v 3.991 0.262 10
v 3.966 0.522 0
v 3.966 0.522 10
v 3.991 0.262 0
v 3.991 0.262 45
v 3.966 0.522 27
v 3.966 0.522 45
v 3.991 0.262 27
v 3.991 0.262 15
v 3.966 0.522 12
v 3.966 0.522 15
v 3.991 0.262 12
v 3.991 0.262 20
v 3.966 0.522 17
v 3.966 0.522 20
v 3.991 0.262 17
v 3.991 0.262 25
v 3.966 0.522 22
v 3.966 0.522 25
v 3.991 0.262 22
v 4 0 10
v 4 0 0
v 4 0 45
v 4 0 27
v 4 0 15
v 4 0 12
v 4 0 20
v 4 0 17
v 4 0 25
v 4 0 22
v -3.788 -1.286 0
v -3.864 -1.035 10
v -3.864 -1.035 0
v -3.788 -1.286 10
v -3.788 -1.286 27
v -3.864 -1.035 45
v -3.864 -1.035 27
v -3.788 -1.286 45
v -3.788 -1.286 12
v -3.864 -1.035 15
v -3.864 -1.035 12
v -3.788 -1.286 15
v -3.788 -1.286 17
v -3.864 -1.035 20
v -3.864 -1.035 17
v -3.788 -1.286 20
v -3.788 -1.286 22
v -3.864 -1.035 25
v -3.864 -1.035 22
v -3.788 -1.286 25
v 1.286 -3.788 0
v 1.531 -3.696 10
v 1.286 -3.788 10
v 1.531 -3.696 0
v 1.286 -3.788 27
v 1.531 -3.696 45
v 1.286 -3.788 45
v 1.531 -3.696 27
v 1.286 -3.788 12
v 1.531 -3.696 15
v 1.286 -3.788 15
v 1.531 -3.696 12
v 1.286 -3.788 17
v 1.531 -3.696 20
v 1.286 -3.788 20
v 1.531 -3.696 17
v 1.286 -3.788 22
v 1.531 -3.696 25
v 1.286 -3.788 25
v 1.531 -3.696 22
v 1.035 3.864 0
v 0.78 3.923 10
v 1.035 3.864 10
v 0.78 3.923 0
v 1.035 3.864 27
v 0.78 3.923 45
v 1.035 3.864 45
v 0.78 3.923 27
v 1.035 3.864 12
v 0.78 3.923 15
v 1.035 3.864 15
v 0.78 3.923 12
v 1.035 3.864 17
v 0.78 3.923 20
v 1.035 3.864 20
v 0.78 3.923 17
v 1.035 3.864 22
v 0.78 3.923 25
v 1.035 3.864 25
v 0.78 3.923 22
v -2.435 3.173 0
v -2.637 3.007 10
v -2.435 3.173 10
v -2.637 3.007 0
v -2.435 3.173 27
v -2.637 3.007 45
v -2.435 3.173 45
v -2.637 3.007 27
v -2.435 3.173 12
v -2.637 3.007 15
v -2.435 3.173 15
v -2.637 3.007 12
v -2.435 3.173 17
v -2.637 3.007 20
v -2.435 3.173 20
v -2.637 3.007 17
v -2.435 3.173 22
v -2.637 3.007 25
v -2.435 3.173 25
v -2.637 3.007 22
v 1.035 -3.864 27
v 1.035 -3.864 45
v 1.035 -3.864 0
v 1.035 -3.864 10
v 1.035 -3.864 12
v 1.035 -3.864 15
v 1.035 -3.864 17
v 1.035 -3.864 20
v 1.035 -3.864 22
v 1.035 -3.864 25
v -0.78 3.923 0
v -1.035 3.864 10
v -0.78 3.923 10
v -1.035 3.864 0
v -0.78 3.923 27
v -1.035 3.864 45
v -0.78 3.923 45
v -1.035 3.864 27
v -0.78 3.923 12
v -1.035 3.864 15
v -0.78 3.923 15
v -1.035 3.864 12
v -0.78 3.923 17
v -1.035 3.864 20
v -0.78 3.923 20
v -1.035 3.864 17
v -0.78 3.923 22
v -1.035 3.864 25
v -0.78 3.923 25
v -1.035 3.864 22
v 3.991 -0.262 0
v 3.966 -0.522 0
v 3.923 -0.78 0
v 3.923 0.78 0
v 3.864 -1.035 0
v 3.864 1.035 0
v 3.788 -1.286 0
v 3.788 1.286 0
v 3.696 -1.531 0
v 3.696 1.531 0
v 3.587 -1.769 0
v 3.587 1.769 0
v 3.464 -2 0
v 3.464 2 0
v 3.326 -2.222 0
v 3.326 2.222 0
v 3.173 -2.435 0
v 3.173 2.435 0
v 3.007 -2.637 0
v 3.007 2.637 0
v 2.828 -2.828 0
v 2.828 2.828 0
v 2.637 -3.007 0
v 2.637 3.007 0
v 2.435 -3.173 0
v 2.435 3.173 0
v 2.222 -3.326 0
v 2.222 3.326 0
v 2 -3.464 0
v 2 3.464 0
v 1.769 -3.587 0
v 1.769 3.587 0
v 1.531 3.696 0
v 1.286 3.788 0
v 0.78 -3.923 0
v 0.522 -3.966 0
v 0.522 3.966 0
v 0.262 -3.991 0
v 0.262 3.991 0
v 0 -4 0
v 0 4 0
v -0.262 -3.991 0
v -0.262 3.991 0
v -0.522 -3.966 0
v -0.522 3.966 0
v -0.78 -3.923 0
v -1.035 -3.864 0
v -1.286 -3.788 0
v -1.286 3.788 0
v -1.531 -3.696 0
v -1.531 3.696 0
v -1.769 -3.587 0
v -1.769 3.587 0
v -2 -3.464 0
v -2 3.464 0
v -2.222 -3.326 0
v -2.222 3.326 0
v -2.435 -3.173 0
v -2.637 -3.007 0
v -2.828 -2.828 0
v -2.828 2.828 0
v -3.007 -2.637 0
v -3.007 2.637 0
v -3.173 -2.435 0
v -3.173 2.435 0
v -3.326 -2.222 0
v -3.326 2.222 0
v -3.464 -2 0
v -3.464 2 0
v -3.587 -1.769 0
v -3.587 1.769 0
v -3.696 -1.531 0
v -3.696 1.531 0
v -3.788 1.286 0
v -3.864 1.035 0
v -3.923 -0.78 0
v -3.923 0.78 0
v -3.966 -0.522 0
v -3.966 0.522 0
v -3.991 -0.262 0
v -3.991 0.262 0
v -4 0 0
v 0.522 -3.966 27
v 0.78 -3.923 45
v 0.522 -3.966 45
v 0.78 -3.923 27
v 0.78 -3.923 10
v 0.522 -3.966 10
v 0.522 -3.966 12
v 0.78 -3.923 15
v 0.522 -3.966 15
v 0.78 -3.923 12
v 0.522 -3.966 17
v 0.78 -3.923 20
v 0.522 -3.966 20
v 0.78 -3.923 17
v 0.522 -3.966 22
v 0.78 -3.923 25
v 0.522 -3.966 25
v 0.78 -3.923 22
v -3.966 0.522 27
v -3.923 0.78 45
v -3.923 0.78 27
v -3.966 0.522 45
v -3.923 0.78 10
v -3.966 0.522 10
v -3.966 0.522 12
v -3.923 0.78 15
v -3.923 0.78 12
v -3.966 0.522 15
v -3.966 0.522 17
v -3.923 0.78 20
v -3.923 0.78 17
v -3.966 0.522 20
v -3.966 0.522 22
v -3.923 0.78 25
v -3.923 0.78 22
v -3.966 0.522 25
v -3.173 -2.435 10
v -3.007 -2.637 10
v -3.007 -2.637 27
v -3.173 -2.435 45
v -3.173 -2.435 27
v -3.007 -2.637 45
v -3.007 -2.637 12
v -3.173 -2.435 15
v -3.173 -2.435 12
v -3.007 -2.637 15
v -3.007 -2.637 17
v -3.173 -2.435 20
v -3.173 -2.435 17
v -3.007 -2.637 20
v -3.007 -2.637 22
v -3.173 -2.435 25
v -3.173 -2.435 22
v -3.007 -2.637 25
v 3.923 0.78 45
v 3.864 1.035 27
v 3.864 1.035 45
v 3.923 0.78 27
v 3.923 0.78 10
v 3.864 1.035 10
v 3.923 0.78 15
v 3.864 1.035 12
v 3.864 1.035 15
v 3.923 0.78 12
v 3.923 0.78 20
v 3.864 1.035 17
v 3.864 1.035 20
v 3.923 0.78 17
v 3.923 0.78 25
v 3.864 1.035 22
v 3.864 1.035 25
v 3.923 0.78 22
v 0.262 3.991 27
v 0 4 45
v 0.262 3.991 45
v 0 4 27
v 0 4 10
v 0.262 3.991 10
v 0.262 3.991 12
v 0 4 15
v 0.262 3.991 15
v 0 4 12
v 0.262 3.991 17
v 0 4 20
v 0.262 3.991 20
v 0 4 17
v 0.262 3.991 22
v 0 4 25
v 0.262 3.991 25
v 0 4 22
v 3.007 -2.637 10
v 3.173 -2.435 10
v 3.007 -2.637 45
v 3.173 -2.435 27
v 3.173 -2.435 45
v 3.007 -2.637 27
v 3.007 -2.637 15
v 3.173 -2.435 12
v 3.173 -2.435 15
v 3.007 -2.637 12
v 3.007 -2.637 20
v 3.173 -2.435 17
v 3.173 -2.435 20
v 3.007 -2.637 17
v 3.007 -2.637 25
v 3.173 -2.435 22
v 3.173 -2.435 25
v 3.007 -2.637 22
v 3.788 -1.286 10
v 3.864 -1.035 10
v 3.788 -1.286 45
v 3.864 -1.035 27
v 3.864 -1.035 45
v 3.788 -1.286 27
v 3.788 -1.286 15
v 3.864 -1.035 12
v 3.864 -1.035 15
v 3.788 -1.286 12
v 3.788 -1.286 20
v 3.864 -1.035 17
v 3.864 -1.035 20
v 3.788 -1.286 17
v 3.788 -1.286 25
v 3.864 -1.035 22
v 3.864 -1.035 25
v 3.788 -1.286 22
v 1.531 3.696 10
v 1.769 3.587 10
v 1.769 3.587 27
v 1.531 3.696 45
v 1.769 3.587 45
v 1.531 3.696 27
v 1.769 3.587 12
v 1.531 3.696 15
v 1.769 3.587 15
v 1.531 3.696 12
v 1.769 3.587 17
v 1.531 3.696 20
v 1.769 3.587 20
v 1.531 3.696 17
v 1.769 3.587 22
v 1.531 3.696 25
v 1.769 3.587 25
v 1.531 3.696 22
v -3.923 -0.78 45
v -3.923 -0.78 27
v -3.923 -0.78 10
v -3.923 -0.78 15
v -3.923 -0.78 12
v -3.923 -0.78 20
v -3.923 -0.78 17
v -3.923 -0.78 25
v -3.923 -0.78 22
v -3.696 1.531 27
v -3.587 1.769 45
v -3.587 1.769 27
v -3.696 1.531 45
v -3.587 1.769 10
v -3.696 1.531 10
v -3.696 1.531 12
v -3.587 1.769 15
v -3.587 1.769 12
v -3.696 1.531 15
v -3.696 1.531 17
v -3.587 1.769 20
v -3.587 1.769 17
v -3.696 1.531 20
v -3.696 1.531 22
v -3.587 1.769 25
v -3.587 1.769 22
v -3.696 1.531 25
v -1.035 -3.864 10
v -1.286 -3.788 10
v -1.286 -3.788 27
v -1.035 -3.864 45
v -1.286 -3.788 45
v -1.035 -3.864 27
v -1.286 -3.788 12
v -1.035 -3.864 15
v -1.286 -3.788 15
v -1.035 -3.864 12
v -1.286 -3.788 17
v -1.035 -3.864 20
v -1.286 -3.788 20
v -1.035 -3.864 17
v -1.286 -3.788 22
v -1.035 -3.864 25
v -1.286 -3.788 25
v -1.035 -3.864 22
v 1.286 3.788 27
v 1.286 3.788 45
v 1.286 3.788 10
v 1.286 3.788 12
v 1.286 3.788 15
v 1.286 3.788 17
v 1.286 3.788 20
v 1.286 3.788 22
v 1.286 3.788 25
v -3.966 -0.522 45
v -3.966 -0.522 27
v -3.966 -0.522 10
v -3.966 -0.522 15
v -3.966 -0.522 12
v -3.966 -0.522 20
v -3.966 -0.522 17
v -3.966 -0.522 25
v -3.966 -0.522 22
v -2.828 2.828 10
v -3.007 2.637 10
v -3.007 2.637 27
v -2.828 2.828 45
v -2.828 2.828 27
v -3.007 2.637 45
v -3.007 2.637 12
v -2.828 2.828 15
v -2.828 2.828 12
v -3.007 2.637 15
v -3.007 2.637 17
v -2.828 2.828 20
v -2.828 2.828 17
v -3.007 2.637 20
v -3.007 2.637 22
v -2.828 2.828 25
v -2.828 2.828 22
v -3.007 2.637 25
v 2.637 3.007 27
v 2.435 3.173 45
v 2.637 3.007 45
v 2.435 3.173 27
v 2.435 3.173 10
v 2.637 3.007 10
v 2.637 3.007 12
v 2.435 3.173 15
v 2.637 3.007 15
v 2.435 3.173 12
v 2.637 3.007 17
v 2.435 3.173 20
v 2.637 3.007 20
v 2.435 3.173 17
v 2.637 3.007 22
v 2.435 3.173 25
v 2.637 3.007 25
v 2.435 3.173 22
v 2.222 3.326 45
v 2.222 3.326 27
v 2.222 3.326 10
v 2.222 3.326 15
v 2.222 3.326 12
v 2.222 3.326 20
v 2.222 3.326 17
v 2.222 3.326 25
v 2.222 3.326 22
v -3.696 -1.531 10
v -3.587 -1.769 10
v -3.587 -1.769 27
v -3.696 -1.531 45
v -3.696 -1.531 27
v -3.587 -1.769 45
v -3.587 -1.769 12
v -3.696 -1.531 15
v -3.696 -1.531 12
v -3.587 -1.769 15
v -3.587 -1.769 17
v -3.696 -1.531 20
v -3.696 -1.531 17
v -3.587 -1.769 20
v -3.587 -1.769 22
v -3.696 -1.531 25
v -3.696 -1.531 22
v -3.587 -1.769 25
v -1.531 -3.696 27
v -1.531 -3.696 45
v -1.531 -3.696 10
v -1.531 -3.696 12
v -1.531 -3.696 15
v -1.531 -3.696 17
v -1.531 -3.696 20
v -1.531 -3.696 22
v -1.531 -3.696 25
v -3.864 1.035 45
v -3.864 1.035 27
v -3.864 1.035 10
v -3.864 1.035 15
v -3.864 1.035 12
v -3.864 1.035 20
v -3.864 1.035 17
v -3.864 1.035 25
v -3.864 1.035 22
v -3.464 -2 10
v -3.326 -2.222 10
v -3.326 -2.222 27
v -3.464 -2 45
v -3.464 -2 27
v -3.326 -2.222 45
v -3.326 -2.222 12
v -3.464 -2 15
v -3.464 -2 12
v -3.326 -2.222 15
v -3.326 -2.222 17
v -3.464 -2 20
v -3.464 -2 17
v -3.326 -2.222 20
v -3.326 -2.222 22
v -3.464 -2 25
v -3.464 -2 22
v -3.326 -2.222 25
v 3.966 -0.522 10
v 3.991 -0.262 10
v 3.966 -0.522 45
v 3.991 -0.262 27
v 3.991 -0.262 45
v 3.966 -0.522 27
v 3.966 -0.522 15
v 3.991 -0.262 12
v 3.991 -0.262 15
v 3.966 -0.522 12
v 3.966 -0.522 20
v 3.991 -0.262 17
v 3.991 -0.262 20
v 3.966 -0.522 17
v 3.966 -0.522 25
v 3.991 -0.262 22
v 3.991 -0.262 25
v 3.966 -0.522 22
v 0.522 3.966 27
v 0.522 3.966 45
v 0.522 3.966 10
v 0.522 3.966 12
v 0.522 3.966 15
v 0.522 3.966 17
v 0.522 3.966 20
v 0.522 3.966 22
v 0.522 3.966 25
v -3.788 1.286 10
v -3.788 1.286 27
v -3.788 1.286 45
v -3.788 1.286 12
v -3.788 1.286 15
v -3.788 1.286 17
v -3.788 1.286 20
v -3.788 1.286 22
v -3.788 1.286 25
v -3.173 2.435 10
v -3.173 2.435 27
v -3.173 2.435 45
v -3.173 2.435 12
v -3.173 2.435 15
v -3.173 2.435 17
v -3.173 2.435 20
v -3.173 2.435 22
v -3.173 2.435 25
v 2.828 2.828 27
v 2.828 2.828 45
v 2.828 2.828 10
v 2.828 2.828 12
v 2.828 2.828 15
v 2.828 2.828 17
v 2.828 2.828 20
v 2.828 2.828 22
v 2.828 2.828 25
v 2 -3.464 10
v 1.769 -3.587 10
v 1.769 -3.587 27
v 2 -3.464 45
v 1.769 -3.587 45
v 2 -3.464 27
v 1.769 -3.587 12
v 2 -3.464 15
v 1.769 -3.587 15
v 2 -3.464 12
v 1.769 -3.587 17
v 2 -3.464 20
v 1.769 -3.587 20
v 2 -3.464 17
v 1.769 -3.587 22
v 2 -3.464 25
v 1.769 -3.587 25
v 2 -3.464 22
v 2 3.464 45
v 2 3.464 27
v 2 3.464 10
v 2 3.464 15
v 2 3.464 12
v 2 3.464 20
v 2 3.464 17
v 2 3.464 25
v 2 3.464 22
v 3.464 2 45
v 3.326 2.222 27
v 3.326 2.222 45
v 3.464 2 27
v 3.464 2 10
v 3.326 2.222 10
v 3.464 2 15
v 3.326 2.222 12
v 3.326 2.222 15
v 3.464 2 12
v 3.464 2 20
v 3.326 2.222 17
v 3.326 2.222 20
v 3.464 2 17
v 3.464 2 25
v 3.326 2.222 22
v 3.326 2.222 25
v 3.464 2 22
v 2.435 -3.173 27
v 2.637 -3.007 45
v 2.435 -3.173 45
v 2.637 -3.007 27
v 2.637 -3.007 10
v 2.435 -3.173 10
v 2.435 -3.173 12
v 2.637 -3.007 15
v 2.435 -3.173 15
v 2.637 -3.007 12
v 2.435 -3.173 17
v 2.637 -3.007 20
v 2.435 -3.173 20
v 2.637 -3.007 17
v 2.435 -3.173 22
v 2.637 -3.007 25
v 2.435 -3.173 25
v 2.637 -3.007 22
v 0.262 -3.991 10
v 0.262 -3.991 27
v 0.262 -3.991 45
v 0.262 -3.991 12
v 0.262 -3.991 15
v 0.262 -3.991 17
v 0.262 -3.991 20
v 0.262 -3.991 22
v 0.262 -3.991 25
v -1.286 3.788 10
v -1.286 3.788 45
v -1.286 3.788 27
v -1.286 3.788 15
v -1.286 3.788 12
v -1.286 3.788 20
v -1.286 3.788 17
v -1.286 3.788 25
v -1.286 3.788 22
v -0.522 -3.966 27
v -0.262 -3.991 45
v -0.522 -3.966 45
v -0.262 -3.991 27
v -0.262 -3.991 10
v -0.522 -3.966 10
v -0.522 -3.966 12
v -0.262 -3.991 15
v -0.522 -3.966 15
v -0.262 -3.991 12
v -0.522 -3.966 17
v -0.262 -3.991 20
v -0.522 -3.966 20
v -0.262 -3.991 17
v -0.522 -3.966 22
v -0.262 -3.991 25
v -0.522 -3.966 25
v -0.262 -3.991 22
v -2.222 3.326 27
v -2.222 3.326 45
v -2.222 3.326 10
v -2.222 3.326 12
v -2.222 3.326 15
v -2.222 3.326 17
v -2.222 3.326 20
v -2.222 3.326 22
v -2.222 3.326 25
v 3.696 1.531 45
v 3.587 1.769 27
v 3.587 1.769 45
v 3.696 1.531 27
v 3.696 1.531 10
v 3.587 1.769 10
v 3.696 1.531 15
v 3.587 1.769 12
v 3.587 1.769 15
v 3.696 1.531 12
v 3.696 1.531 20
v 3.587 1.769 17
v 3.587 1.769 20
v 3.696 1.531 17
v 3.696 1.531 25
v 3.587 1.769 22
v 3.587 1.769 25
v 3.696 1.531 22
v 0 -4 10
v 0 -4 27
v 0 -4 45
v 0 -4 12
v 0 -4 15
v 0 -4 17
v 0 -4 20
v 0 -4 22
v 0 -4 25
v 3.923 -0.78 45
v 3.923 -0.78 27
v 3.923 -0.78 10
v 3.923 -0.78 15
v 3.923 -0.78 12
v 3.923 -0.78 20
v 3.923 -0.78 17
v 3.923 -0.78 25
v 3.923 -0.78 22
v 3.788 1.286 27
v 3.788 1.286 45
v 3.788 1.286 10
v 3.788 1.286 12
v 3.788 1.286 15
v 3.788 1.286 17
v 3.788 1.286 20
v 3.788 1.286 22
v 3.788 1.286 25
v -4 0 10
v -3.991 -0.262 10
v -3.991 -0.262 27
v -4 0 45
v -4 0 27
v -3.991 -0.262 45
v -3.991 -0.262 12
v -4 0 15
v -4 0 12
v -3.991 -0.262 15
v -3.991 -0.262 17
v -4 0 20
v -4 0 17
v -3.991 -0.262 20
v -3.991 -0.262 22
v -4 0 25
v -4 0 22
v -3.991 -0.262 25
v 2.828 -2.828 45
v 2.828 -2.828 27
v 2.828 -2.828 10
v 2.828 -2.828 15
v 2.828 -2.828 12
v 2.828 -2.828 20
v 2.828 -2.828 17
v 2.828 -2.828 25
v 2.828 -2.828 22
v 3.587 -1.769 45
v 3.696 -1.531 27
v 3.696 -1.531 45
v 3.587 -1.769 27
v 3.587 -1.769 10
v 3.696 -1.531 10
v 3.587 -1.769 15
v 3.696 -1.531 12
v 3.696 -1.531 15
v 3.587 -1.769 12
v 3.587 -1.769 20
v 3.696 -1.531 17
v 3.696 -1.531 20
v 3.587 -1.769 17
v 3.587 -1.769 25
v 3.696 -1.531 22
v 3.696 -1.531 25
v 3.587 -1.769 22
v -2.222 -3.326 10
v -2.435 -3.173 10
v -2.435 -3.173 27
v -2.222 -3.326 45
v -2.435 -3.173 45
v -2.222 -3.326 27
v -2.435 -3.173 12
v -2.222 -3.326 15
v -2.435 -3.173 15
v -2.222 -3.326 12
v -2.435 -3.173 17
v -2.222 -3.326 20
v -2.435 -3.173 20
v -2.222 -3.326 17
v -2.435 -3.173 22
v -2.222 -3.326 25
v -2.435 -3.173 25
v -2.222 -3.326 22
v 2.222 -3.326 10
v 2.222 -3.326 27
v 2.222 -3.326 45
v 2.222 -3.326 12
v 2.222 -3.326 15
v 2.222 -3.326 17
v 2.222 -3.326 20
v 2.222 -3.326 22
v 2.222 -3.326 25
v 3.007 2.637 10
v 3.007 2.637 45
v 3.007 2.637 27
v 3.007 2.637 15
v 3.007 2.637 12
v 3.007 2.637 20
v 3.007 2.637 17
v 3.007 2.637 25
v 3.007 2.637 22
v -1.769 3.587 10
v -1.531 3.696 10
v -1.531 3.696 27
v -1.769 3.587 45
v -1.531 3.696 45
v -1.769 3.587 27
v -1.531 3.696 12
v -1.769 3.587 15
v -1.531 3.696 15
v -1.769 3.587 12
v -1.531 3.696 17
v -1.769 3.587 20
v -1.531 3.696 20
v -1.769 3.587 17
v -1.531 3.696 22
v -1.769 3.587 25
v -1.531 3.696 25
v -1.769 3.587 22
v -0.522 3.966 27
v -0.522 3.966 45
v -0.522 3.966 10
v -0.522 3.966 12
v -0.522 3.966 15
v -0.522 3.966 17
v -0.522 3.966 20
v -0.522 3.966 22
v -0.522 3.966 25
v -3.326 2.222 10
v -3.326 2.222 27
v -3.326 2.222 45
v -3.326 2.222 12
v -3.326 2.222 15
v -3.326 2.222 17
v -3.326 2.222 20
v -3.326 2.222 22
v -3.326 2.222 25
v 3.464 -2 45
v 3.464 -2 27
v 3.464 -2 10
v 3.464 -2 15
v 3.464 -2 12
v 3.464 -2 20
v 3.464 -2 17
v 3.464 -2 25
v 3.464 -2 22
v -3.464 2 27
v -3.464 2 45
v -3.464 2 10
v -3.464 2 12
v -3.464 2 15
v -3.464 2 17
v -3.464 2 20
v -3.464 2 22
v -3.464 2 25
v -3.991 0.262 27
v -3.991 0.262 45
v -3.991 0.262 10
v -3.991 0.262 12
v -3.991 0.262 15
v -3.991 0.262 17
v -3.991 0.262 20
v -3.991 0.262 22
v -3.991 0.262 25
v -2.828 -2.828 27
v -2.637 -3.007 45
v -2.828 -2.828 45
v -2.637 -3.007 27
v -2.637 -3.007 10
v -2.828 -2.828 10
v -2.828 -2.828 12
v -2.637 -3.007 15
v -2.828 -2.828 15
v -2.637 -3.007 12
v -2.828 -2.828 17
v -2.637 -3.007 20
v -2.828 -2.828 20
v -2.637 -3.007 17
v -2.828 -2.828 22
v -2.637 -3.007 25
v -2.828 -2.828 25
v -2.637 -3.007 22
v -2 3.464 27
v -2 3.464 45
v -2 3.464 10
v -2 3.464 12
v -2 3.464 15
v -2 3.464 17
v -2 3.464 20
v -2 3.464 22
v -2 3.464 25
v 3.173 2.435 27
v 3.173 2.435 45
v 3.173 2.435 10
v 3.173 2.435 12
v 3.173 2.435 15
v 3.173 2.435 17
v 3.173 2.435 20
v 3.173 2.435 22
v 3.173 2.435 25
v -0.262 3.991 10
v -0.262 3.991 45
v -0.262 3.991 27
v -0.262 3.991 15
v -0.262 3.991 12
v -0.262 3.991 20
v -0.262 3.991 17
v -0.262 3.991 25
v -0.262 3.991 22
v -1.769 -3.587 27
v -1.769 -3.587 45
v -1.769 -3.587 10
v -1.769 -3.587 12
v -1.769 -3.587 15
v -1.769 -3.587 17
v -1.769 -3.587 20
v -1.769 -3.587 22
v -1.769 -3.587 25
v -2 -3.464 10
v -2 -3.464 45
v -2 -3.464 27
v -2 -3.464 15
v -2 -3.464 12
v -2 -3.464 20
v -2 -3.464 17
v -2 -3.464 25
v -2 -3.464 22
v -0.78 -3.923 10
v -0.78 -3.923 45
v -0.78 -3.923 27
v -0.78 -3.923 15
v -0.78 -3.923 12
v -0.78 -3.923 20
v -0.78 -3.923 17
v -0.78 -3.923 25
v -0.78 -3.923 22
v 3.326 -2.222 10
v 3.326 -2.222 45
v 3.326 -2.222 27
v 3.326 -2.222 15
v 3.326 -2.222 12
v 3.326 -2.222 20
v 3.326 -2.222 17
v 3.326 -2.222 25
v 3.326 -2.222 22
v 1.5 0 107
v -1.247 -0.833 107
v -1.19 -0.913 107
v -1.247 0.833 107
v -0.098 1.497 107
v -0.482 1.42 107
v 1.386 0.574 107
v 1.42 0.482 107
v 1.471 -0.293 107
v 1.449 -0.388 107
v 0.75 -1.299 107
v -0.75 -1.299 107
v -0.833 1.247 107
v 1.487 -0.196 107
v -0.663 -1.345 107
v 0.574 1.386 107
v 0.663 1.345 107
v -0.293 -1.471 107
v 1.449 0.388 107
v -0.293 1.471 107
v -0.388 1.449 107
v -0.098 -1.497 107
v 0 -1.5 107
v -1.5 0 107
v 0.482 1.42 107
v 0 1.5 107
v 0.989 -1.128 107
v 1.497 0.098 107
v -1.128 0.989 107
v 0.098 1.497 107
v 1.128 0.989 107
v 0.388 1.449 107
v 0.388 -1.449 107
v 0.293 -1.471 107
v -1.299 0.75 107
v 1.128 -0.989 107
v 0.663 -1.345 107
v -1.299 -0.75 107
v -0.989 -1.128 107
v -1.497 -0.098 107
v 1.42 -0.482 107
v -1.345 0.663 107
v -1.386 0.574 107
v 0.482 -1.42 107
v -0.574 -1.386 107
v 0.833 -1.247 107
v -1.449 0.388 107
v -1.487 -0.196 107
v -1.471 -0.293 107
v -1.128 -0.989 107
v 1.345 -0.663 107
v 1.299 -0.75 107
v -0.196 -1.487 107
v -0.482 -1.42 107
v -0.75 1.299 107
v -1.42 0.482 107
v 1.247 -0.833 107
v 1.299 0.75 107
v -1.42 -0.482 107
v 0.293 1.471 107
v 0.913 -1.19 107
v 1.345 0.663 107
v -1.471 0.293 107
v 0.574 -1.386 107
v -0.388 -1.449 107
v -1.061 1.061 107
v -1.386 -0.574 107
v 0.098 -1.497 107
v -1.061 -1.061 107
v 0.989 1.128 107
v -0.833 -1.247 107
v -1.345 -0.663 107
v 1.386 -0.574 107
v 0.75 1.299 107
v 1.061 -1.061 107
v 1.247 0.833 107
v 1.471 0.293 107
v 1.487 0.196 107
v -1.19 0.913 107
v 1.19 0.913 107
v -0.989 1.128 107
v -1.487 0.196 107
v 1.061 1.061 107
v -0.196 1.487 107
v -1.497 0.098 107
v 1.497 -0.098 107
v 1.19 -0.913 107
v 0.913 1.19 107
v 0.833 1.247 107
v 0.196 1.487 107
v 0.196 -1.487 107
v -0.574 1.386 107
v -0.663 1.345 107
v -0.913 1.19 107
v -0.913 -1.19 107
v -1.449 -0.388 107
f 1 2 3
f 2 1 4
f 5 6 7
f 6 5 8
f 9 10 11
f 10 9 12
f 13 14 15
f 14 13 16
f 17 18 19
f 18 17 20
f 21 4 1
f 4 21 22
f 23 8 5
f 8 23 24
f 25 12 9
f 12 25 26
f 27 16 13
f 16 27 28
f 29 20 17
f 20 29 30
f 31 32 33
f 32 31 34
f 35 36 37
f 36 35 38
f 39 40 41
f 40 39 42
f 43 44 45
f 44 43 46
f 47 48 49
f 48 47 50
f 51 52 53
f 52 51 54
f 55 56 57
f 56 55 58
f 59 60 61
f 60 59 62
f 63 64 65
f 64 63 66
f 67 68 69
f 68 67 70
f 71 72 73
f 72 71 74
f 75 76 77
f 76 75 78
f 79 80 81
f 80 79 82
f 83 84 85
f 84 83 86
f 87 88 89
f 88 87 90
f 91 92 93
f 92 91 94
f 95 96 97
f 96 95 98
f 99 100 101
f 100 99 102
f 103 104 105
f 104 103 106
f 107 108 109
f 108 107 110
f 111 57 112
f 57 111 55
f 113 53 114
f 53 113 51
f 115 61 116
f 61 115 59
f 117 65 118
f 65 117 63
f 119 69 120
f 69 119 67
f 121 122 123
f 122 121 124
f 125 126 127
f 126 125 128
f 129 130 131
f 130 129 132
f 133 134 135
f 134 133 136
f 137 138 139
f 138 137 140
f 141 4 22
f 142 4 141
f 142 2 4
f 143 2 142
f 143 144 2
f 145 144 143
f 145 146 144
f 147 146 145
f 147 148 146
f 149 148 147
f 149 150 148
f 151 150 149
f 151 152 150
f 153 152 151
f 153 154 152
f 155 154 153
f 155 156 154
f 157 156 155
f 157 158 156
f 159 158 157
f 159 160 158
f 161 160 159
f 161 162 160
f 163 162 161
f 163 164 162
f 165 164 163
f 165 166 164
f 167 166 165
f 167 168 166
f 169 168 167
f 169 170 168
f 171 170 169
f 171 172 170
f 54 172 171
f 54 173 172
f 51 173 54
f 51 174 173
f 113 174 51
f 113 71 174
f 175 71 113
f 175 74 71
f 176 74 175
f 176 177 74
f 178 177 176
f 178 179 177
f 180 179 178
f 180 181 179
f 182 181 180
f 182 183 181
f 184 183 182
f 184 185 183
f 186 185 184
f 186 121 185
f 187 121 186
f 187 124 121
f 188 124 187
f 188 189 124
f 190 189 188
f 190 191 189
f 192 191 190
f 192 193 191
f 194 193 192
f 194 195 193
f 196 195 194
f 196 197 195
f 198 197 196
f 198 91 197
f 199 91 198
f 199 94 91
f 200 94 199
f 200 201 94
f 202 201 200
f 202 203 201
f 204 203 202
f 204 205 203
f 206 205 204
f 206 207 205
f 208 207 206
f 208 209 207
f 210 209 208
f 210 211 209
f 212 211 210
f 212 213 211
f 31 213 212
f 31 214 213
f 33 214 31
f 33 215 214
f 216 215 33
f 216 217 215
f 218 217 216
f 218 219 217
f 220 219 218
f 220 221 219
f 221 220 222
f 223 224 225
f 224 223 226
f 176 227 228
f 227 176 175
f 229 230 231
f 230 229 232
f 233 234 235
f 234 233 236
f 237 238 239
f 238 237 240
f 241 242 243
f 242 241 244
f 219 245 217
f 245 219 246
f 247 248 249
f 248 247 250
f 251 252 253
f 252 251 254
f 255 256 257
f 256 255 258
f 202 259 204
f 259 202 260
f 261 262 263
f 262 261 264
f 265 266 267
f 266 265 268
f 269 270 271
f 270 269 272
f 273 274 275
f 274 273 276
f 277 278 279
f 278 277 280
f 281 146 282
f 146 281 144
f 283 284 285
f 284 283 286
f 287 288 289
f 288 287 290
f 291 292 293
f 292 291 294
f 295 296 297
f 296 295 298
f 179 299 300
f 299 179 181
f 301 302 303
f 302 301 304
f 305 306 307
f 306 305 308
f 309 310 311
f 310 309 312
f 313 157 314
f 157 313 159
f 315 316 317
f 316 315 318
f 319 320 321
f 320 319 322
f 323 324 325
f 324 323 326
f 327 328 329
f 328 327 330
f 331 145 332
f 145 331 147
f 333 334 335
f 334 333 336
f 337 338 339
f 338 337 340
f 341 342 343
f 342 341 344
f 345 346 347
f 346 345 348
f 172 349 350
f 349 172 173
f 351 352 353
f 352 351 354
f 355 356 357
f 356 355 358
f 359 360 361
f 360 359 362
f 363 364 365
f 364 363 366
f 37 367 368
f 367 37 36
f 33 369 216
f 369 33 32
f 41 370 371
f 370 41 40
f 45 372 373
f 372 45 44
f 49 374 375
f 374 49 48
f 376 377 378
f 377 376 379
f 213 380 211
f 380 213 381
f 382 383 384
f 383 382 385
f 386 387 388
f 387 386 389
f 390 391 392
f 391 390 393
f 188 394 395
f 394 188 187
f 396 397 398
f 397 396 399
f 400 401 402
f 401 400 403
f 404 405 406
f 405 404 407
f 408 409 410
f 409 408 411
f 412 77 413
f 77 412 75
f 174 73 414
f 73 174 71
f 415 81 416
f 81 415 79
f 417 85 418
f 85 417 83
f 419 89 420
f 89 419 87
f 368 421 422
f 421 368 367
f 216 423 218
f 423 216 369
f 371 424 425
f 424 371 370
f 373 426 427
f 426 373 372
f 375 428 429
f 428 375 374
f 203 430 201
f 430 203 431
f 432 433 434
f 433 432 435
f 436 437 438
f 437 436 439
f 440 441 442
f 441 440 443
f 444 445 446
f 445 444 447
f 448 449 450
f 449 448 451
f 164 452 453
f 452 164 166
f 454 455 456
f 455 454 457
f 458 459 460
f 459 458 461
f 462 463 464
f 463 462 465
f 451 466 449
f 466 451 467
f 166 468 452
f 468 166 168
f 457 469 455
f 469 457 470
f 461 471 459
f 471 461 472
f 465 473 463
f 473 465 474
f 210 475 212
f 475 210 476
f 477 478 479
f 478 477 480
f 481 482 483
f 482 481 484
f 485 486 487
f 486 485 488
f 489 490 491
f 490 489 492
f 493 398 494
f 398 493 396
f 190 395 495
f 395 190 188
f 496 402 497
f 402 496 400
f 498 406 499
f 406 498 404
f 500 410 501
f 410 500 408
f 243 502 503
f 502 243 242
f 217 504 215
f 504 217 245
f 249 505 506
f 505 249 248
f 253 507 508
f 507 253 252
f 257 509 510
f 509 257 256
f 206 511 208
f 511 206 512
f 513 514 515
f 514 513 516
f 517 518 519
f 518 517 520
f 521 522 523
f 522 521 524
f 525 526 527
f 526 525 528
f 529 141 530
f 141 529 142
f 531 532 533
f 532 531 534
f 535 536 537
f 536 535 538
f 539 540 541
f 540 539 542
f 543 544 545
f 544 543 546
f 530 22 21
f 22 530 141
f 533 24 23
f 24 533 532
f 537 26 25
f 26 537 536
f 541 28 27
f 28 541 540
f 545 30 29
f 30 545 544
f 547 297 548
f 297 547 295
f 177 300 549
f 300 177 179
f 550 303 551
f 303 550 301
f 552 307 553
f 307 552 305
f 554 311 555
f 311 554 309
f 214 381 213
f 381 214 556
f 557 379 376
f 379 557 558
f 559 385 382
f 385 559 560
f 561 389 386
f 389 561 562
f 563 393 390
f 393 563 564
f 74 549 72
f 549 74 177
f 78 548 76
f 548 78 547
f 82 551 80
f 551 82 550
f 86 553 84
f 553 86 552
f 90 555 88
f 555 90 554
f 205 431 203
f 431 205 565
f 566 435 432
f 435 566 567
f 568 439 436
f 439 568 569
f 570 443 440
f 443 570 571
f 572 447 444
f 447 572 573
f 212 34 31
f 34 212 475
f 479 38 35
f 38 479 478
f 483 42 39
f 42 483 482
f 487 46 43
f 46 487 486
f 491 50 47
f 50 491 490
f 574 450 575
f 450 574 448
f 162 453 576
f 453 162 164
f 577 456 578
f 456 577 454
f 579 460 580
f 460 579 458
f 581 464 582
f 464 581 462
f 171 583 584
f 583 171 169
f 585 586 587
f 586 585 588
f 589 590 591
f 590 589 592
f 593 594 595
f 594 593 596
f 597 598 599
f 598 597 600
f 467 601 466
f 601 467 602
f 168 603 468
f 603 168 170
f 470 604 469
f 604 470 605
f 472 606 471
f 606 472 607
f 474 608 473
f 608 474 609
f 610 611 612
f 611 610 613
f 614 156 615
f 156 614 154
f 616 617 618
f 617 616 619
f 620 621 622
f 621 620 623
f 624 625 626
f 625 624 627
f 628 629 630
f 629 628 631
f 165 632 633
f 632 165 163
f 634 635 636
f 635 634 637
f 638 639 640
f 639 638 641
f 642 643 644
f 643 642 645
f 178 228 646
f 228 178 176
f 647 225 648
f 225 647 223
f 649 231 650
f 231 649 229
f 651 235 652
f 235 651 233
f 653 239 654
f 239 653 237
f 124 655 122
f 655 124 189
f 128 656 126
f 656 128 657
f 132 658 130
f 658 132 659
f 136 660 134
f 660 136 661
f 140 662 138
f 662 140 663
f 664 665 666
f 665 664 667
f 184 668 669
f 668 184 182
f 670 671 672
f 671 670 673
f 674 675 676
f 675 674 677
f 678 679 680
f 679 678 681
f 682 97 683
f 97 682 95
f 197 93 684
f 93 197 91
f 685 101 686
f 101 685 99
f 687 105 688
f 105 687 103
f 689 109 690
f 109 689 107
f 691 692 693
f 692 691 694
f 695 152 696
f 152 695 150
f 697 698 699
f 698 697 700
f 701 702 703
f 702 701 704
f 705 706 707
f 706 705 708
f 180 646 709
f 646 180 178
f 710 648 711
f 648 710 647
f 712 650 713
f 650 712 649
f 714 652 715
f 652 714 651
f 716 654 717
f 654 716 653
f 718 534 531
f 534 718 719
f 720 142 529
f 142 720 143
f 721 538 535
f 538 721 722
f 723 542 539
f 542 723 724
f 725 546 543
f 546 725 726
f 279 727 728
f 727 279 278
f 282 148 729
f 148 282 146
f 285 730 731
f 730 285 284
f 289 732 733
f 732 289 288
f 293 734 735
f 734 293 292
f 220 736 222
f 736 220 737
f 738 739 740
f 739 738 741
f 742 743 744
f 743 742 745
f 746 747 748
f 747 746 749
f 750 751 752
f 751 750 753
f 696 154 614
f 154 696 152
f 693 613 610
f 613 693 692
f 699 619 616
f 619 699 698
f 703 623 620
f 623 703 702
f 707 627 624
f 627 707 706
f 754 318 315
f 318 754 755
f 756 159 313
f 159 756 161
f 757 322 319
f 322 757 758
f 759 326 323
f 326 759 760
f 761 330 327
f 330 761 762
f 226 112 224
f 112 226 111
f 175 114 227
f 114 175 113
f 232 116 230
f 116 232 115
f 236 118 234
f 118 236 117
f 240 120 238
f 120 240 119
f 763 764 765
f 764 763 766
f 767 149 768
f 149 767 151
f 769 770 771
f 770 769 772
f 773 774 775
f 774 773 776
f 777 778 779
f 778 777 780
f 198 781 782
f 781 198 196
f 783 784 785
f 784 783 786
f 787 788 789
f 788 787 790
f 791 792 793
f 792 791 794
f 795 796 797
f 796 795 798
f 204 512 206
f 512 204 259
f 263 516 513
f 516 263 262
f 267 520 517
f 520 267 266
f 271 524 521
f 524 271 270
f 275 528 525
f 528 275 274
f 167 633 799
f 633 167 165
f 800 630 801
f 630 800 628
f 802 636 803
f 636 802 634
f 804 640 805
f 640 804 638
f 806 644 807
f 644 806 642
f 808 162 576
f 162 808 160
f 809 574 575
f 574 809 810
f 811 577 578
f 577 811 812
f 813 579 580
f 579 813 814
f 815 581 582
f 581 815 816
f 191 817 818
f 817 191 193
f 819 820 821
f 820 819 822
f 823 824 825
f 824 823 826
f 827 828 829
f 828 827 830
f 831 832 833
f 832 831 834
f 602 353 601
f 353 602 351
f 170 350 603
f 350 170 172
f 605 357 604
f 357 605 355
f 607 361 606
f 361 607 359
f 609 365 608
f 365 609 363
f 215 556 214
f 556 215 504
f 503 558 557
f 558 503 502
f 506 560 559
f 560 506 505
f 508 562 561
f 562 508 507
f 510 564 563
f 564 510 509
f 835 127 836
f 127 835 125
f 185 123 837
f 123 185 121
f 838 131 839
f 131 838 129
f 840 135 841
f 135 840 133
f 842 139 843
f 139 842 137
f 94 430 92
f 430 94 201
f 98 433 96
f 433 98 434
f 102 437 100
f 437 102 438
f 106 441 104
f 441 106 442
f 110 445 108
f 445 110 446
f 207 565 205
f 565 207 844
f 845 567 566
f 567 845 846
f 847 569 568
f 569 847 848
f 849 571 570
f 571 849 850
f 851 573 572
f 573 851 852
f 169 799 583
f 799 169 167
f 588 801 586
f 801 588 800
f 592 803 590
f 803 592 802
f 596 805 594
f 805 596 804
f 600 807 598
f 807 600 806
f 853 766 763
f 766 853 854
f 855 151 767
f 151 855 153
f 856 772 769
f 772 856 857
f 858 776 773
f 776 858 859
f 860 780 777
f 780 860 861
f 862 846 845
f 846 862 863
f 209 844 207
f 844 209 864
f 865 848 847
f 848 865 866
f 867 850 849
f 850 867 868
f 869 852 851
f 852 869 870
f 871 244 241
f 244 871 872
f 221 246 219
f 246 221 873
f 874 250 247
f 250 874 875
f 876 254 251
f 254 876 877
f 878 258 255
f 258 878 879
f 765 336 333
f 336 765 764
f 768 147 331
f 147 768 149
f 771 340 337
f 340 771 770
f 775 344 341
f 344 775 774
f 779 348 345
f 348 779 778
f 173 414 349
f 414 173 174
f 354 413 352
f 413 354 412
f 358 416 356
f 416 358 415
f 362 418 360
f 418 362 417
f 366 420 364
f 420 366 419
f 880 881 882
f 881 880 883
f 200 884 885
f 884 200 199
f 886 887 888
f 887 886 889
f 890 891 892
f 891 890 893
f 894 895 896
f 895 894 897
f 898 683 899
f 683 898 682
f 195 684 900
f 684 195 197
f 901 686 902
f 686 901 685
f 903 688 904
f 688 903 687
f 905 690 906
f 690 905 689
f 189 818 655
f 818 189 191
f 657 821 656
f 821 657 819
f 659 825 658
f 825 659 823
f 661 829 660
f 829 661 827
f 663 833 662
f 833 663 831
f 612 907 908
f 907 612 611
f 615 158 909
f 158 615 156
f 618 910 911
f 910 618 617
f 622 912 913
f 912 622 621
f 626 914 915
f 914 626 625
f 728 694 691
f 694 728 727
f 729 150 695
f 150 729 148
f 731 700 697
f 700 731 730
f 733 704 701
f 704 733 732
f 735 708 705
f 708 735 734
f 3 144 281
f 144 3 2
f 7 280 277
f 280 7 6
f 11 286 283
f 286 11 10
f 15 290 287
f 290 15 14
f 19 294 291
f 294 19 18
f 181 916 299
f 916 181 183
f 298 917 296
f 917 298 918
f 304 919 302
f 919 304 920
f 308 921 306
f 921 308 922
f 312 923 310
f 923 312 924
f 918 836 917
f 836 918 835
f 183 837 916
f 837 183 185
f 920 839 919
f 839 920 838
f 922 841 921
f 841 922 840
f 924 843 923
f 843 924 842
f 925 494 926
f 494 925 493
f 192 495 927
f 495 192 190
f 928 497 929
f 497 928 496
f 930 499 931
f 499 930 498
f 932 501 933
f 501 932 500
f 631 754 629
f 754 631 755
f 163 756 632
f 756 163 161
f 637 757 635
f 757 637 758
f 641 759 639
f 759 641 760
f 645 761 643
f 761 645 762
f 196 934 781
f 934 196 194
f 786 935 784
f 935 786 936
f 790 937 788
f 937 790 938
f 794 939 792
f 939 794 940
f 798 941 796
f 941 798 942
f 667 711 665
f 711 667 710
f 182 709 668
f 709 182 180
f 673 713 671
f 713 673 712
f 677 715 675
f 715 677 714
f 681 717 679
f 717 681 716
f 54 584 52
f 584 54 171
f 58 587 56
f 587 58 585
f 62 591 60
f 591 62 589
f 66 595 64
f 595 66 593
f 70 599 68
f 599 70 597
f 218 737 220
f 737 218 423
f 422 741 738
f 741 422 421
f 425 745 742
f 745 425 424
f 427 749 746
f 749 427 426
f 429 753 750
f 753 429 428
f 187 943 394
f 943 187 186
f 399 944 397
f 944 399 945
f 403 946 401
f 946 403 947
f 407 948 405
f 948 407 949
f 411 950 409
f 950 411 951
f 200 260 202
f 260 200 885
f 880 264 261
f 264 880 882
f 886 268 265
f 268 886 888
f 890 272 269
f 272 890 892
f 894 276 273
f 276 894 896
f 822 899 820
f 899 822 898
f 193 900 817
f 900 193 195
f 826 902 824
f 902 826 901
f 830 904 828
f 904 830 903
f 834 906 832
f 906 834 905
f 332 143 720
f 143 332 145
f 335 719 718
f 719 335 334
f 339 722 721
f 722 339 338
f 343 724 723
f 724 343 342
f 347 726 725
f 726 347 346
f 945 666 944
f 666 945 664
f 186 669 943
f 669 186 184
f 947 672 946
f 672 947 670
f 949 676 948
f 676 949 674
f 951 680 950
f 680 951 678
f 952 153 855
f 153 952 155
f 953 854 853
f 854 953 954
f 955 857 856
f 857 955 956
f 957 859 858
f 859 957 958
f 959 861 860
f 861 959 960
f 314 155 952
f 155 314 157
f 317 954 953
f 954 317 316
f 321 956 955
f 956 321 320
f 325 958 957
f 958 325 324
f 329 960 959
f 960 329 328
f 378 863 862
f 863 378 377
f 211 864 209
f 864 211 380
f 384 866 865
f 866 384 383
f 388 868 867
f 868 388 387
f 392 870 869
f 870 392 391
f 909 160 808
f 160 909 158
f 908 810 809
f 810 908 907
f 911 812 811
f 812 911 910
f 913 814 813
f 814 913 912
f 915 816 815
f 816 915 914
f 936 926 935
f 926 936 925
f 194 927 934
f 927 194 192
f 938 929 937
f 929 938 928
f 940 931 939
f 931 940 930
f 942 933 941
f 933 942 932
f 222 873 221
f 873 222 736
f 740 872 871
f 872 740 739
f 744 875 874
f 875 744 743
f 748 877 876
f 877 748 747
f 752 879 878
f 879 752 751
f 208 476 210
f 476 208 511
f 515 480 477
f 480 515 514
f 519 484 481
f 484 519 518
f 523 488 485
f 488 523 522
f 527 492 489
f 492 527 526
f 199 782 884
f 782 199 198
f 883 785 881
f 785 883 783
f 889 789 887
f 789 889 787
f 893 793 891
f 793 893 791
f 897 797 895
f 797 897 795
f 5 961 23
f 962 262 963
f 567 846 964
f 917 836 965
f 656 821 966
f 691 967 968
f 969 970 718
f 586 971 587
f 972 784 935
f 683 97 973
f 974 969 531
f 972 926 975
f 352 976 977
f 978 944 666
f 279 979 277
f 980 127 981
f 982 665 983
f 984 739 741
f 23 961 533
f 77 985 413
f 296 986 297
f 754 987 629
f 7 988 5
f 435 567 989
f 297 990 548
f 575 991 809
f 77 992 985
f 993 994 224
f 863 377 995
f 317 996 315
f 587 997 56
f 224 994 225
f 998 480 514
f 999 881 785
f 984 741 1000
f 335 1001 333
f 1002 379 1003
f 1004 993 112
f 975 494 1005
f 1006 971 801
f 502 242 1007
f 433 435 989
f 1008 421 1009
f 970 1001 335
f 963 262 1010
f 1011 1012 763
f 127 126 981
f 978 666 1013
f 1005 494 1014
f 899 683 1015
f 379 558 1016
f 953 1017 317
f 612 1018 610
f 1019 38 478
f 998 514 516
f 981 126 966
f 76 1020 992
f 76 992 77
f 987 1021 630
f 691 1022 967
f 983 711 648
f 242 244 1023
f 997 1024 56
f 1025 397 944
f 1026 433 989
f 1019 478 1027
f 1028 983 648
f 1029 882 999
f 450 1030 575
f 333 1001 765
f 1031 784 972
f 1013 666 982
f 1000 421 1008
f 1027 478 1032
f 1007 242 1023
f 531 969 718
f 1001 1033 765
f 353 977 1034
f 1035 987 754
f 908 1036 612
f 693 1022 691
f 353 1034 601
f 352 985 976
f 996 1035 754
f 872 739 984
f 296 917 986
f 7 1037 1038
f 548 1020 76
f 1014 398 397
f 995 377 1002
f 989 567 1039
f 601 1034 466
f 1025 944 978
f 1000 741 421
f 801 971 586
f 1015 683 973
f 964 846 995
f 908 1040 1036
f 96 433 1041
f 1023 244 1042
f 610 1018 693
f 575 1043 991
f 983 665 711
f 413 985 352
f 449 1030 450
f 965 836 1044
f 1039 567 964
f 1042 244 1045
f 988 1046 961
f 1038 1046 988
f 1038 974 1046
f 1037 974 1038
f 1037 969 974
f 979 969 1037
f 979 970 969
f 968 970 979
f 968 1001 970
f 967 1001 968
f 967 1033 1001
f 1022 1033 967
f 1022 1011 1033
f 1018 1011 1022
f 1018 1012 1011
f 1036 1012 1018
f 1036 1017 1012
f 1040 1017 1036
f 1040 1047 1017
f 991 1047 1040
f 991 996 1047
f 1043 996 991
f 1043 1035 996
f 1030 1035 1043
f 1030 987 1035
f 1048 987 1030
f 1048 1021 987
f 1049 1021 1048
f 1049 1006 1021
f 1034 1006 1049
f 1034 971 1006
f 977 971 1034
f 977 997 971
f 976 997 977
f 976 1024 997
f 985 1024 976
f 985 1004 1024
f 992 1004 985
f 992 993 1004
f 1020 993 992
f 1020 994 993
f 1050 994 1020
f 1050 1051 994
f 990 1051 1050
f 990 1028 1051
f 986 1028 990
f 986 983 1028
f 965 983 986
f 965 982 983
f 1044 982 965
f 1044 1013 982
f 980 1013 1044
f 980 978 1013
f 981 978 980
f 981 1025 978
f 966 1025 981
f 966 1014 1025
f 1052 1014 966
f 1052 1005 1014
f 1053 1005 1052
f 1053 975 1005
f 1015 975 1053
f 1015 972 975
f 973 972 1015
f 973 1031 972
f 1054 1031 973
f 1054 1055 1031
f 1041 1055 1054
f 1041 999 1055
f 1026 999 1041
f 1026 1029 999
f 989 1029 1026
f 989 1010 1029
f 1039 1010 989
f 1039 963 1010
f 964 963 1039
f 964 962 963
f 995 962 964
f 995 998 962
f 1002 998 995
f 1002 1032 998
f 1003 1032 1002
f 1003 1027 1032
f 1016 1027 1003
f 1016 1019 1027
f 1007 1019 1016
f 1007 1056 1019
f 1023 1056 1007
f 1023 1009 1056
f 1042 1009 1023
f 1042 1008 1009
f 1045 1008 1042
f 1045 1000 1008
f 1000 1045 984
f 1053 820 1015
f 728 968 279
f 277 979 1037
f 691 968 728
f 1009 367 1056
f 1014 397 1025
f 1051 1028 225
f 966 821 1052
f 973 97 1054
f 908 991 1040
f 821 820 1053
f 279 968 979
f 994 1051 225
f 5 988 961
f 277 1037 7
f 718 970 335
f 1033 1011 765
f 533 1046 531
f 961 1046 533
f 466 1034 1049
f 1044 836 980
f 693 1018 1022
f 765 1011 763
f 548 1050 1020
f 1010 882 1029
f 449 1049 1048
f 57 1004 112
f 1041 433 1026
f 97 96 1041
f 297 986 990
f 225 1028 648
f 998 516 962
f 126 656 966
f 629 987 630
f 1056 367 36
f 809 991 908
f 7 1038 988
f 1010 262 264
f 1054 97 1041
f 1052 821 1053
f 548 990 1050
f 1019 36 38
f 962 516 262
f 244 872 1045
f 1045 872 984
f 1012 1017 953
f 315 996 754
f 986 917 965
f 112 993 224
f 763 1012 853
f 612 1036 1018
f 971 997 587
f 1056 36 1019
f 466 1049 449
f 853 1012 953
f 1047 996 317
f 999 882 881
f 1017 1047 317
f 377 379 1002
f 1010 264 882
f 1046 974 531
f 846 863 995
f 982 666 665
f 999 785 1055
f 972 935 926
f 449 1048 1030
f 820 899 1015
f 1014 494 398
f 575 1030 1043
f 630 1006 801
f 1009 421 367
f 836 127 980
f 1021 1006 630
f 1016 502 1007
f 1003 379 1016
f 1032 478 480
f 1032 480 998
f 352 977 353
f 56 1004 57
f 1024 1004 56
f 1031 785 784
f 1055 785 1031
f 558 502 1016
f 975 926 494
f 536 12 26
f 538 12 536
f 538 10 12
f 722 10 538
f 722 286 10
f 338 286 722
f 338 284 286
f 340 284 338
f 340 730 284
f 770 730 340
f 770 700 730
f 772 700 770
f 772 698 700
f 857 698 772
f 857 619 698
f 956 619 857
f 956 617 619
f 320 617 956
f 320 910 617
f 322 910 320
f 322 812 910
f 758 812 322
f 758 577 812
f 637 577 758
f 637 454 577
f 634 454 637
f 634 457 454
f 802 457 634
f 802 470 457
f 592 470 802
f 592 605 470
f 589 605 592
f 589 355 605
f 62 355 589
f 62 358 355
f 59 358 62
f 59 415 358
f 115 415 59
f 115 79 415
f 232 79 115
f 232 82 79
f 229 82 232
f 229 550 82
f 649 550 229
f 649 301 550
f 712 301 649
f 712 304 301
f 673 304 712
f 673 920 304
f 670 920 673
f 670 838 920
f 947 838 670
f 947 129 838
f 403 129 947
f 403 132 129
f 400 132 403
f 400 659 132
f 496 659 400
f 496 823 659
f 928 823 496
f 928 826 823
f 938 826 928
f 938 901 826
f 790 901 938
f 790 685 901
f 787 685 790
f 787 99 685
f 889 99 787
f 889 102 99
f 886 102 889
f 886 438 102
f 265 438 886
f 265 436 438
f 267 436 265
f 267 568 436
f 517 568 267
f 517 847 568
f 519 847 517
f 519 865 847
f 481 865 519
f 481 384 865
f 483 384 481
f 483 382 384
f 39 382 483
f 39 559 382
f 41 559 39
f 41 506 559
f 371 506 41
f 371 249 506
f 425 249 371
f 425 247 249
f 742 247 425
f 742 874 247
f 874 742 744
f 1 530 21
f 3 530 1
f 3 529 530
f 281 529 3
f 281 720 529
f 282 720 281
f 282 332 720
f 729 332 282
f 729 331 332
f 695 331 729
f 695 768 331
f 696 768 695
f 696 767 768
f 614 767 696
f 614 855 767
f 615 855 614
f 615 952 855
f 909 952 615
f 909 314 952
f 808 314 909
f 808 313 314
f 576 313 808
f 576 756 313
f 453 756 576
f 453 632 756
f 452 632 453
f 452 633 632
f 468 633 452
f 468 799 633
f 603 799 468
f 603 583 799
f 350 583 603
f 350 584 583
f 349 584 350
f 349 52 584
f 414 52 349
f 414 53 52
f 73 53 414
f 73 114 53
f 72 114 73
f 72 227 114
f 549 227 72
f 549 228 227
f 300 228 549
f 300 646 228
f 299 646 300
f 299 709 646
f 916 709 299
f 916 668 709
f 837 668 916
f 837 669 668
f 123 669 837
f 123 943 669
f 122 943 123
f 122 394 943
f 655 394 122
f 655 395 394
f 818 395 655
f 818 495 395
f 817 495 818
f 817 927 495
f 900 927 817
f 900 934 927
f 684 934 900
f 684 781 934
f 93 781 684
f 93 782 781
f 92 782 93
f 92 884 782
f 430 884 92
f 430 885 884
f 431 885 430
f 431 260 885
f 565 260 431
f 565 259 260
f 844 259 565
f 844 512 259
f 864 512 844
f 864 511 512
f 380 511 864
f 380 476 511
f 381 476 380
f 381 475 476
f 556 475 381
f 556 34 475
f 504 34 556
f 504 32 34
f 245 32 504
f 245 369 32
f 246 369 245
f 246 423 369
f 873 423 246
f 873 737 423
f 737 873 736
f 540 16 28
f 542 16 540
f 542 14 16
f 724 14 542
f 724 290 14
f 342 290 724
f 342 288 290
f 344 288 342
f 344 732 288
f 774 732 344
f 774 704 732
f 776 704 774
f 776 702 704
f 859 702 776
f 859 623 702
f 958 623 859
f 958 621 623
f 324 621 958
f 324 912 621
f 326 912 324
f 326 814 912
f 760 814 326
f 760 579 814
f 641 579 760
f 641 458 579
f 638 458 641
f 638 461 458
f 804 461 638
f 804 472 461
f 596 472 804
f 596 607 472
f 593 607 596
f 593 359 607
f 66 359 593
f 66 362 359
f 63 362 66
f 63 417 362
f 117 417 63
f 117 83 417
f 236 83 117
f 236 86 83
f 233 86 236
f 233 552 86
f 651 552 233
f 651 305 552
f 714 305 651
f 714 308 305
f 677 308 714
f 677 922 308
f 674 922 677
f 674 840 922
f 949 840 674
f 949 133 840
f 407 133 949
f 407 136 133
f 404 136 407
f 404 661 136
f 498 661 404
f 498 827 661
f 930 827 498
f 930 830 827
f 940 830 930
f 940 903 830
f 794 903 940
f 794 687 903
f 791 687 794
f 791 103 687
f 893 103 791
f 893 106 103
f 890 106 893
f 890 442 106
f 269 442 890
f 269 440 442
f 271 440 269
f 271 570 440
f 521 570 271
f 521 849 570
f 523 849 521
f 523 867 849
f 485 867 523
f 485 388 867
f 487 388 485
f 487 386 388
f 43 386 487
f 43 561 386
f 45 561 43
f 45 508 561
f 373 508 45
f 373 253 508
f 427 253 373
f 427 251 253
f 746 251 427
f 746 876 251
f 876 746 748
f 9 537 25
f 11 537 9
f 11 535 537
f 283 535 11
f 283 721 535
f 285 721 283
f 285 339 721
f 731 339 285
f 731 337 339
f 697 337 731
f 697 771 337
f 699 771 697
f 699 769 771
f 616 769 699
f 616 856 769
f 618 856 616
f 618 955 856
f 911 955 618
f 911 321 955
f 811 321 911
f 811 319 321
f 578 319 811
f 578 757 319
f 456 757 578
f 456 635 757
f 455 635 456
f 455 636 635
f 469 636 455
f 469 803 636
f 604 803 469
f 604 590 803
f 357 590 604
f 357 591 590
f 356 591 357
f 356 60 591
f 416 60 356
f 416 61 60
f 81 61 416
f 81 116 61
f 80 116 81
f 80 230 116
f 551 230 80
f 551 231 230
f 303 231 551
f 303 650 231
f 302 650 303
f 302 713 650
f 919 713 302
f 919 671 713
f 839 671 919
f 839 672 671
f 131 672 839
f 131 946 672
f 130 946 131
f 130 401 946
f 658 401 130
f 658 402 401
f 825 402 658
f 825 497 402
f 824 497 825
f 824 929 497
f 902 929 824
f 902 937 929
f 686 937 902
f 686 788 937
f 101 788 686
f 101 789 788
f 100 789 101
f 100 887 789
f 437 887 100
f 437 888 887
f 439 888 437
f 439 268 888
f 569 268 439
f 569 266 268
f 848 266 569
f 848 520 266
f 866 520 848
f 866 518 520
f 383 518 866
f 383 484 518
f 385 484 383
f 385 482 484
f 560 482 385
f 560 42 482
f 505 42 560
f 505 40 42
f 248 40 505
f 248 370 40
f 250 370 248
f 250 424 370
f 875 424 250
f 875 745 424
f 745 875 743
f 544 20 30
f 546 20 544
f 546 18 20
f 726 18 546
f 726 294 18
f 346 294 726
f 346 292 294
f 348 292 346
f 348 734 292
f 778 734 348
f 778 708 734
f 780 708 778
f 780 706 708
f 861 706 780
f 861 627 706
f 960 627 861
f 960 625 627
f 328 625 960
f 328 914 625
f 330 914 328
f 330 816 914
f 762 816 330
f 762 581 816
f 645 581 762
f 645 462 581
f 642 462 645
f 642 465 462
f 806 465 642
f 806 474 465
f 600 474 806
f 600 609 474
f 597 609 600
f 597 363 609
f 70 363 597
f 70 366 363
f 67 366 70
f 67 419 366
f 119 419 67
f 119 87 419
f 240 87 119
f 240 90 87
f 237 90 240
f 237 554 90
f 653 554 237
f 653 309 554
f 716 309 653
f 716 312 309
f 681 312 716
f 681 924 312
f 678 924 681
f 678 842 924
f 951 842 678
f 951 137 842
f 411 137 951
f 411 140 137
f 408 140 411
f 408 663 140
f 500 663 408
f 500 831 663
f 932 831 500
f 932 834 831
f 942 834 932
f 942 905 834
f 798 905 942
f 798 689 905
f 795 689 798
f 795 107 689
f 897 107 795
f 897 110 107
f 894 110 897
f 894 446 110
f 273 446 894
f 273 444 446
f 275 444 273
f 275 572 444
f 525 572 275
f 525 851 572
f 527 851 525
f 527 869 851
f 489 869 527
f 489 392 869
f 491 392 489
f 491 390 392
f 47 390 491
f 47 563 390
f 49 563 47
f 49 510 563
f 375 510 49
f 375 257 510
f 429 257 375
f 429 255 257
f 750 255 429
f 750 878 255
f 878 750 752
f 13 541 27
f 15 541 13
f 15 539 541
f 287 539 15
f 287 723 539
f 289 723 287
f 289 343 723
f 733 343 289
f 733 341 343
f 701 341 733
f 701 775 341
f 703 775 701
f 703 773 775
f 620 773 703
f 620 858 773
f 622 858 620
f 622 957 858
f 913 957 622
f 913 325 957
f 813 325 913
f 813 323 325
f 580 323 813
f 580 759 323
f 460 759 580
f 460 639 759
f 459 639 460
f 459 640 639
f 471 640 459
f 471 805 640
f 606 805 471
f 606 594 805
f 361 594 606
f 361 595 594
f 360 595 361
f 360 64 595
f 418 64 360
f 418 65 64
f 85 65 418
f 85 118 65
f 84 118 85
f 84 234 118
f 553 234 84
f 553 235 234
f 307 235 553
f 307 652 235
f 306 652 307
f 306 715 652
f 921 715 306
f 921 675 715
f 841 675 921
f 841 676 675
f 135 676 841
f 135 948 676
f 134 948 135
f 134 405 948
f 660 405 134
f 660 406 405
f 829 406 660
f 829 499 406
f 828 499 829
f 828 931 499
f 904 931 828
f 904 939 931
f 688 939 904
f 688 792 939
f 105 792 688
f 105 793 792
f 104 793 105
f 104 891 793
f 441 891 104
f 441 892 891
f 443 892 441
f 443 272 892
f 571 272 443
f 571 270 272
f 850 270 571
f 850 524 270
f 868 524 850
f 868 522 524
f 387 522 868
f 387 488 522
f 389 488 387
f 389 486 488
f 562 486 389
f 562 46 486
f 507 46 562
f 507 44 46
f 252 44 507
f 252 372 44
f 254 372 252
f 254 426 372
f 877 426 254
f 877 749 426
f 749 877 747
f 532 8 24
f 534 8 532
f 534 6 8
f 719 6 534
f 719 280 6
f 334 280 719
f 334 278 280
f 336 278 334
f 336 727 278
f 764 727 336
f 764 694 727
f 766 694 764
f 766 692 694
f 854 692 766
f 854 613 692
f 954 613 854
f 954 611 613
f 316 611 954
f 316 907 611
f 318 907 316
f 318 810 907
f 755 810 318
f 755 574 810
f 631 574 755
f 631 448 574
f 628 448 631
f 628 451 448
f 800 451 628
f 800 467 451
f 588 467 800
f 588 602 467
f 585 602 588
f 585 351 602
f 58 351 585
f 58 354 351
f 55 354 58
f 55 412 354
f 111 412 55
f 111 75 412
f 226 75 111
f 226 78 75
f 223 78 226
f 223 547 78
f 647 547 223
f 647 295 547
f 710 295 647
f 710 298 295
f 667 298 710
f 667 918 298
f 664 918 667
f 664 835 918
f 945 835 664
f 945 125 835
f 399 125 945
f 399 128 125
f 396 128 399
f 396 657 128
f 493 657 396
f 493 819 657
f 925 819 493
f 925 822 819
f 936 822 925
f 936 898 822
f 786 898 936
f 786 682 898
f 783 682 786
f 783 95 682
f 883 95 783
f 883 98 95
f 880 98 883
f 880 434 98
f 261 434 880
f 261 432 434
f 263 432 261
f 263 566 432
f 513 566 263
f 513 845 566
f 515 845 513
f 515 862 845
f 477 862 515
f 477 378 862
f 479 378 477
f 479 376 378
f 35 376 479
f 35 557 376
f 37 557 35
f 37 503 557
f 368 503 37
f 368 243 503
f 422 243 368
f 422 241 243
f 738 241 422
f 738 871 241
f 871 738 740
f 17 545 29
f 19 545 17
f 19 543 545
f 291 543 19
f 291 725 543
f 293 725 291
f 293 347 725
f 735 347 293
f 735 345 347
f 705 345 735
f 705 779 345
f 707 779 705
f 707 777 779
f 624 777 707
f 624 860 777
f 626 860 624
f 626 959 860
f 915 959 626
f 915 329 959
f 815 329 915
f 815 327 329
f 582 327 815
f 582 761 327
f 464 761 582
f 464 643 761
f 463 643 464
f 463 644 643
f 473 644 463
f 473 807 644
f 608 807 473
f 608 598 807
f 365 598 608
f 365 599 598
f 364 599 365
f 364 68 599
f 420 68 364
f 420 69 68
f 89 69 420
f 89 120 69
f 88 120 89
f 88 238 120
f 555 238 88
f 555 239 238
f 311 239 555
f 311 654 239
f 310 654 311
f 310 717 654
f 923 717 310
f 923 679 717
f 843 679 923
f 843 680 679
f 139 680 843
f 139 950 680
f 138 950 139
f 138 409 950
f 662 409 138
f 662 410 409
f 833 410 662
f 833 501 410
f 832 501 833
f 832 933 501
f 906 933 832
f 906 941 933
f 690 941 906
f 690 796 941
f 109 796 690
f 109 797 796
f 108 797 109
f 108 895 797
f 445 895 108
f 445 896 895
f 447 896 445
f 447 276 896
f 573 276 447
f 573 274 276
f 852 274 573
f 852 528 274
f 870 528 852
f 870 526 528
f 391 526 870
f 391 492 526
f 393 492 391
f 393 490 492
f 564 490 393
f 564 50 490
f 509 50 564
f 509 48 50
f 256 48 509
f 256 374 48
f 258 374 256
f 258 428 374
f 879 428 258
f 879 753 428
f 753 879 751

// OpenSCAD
// Pestle for grinding tissue inside a 1.5 mL microcentrifuge tube
// Print orientation: standing upright, handle at the bottom

// ---- Dimensions (mm) ----
handle_d        = 8;     // handle diameter
handle_top_z    = 45;    // top of handle / start of cone
cone_top_d      = 3;     // cone diameter at tip
sphere_d        = 3;     // tip sphere diameter
groove_w        = 2;     // groove width (Z)
groove_depth    = 1;     // groove depth (radial)
groove_centres  = [10, 15, 20, 25]; // groove centre heights
eps             = 0.5;   // cutter overshoot past faces

$fn = 96;

// ---- Model ----
difference() {
    union() {
        // Handle
        cylinder(d = handle_d, h = handle_top_z);
        // Cone (8 mm -> 3 mm over 45..62 mm)
        translate([0, 0, handle_top_z])
            cylinder(d1 = handle_d, d2 = cone_top_d, h = handle_top_z + 17);
        // Rounded tip: 3 mm sphere centred at z = 62
        translate([0, 0, handle_top_z + 17])
            sphere(d = sphere_d);
    }

    // Grip grooves, cut fully through the handle
    for (z = groove_centres)
        translate([0, 0, z])
            cylinder(d = handle_d + 2 * eps, h = groove_w, depth = groove_depth, $fn = 96);
}
